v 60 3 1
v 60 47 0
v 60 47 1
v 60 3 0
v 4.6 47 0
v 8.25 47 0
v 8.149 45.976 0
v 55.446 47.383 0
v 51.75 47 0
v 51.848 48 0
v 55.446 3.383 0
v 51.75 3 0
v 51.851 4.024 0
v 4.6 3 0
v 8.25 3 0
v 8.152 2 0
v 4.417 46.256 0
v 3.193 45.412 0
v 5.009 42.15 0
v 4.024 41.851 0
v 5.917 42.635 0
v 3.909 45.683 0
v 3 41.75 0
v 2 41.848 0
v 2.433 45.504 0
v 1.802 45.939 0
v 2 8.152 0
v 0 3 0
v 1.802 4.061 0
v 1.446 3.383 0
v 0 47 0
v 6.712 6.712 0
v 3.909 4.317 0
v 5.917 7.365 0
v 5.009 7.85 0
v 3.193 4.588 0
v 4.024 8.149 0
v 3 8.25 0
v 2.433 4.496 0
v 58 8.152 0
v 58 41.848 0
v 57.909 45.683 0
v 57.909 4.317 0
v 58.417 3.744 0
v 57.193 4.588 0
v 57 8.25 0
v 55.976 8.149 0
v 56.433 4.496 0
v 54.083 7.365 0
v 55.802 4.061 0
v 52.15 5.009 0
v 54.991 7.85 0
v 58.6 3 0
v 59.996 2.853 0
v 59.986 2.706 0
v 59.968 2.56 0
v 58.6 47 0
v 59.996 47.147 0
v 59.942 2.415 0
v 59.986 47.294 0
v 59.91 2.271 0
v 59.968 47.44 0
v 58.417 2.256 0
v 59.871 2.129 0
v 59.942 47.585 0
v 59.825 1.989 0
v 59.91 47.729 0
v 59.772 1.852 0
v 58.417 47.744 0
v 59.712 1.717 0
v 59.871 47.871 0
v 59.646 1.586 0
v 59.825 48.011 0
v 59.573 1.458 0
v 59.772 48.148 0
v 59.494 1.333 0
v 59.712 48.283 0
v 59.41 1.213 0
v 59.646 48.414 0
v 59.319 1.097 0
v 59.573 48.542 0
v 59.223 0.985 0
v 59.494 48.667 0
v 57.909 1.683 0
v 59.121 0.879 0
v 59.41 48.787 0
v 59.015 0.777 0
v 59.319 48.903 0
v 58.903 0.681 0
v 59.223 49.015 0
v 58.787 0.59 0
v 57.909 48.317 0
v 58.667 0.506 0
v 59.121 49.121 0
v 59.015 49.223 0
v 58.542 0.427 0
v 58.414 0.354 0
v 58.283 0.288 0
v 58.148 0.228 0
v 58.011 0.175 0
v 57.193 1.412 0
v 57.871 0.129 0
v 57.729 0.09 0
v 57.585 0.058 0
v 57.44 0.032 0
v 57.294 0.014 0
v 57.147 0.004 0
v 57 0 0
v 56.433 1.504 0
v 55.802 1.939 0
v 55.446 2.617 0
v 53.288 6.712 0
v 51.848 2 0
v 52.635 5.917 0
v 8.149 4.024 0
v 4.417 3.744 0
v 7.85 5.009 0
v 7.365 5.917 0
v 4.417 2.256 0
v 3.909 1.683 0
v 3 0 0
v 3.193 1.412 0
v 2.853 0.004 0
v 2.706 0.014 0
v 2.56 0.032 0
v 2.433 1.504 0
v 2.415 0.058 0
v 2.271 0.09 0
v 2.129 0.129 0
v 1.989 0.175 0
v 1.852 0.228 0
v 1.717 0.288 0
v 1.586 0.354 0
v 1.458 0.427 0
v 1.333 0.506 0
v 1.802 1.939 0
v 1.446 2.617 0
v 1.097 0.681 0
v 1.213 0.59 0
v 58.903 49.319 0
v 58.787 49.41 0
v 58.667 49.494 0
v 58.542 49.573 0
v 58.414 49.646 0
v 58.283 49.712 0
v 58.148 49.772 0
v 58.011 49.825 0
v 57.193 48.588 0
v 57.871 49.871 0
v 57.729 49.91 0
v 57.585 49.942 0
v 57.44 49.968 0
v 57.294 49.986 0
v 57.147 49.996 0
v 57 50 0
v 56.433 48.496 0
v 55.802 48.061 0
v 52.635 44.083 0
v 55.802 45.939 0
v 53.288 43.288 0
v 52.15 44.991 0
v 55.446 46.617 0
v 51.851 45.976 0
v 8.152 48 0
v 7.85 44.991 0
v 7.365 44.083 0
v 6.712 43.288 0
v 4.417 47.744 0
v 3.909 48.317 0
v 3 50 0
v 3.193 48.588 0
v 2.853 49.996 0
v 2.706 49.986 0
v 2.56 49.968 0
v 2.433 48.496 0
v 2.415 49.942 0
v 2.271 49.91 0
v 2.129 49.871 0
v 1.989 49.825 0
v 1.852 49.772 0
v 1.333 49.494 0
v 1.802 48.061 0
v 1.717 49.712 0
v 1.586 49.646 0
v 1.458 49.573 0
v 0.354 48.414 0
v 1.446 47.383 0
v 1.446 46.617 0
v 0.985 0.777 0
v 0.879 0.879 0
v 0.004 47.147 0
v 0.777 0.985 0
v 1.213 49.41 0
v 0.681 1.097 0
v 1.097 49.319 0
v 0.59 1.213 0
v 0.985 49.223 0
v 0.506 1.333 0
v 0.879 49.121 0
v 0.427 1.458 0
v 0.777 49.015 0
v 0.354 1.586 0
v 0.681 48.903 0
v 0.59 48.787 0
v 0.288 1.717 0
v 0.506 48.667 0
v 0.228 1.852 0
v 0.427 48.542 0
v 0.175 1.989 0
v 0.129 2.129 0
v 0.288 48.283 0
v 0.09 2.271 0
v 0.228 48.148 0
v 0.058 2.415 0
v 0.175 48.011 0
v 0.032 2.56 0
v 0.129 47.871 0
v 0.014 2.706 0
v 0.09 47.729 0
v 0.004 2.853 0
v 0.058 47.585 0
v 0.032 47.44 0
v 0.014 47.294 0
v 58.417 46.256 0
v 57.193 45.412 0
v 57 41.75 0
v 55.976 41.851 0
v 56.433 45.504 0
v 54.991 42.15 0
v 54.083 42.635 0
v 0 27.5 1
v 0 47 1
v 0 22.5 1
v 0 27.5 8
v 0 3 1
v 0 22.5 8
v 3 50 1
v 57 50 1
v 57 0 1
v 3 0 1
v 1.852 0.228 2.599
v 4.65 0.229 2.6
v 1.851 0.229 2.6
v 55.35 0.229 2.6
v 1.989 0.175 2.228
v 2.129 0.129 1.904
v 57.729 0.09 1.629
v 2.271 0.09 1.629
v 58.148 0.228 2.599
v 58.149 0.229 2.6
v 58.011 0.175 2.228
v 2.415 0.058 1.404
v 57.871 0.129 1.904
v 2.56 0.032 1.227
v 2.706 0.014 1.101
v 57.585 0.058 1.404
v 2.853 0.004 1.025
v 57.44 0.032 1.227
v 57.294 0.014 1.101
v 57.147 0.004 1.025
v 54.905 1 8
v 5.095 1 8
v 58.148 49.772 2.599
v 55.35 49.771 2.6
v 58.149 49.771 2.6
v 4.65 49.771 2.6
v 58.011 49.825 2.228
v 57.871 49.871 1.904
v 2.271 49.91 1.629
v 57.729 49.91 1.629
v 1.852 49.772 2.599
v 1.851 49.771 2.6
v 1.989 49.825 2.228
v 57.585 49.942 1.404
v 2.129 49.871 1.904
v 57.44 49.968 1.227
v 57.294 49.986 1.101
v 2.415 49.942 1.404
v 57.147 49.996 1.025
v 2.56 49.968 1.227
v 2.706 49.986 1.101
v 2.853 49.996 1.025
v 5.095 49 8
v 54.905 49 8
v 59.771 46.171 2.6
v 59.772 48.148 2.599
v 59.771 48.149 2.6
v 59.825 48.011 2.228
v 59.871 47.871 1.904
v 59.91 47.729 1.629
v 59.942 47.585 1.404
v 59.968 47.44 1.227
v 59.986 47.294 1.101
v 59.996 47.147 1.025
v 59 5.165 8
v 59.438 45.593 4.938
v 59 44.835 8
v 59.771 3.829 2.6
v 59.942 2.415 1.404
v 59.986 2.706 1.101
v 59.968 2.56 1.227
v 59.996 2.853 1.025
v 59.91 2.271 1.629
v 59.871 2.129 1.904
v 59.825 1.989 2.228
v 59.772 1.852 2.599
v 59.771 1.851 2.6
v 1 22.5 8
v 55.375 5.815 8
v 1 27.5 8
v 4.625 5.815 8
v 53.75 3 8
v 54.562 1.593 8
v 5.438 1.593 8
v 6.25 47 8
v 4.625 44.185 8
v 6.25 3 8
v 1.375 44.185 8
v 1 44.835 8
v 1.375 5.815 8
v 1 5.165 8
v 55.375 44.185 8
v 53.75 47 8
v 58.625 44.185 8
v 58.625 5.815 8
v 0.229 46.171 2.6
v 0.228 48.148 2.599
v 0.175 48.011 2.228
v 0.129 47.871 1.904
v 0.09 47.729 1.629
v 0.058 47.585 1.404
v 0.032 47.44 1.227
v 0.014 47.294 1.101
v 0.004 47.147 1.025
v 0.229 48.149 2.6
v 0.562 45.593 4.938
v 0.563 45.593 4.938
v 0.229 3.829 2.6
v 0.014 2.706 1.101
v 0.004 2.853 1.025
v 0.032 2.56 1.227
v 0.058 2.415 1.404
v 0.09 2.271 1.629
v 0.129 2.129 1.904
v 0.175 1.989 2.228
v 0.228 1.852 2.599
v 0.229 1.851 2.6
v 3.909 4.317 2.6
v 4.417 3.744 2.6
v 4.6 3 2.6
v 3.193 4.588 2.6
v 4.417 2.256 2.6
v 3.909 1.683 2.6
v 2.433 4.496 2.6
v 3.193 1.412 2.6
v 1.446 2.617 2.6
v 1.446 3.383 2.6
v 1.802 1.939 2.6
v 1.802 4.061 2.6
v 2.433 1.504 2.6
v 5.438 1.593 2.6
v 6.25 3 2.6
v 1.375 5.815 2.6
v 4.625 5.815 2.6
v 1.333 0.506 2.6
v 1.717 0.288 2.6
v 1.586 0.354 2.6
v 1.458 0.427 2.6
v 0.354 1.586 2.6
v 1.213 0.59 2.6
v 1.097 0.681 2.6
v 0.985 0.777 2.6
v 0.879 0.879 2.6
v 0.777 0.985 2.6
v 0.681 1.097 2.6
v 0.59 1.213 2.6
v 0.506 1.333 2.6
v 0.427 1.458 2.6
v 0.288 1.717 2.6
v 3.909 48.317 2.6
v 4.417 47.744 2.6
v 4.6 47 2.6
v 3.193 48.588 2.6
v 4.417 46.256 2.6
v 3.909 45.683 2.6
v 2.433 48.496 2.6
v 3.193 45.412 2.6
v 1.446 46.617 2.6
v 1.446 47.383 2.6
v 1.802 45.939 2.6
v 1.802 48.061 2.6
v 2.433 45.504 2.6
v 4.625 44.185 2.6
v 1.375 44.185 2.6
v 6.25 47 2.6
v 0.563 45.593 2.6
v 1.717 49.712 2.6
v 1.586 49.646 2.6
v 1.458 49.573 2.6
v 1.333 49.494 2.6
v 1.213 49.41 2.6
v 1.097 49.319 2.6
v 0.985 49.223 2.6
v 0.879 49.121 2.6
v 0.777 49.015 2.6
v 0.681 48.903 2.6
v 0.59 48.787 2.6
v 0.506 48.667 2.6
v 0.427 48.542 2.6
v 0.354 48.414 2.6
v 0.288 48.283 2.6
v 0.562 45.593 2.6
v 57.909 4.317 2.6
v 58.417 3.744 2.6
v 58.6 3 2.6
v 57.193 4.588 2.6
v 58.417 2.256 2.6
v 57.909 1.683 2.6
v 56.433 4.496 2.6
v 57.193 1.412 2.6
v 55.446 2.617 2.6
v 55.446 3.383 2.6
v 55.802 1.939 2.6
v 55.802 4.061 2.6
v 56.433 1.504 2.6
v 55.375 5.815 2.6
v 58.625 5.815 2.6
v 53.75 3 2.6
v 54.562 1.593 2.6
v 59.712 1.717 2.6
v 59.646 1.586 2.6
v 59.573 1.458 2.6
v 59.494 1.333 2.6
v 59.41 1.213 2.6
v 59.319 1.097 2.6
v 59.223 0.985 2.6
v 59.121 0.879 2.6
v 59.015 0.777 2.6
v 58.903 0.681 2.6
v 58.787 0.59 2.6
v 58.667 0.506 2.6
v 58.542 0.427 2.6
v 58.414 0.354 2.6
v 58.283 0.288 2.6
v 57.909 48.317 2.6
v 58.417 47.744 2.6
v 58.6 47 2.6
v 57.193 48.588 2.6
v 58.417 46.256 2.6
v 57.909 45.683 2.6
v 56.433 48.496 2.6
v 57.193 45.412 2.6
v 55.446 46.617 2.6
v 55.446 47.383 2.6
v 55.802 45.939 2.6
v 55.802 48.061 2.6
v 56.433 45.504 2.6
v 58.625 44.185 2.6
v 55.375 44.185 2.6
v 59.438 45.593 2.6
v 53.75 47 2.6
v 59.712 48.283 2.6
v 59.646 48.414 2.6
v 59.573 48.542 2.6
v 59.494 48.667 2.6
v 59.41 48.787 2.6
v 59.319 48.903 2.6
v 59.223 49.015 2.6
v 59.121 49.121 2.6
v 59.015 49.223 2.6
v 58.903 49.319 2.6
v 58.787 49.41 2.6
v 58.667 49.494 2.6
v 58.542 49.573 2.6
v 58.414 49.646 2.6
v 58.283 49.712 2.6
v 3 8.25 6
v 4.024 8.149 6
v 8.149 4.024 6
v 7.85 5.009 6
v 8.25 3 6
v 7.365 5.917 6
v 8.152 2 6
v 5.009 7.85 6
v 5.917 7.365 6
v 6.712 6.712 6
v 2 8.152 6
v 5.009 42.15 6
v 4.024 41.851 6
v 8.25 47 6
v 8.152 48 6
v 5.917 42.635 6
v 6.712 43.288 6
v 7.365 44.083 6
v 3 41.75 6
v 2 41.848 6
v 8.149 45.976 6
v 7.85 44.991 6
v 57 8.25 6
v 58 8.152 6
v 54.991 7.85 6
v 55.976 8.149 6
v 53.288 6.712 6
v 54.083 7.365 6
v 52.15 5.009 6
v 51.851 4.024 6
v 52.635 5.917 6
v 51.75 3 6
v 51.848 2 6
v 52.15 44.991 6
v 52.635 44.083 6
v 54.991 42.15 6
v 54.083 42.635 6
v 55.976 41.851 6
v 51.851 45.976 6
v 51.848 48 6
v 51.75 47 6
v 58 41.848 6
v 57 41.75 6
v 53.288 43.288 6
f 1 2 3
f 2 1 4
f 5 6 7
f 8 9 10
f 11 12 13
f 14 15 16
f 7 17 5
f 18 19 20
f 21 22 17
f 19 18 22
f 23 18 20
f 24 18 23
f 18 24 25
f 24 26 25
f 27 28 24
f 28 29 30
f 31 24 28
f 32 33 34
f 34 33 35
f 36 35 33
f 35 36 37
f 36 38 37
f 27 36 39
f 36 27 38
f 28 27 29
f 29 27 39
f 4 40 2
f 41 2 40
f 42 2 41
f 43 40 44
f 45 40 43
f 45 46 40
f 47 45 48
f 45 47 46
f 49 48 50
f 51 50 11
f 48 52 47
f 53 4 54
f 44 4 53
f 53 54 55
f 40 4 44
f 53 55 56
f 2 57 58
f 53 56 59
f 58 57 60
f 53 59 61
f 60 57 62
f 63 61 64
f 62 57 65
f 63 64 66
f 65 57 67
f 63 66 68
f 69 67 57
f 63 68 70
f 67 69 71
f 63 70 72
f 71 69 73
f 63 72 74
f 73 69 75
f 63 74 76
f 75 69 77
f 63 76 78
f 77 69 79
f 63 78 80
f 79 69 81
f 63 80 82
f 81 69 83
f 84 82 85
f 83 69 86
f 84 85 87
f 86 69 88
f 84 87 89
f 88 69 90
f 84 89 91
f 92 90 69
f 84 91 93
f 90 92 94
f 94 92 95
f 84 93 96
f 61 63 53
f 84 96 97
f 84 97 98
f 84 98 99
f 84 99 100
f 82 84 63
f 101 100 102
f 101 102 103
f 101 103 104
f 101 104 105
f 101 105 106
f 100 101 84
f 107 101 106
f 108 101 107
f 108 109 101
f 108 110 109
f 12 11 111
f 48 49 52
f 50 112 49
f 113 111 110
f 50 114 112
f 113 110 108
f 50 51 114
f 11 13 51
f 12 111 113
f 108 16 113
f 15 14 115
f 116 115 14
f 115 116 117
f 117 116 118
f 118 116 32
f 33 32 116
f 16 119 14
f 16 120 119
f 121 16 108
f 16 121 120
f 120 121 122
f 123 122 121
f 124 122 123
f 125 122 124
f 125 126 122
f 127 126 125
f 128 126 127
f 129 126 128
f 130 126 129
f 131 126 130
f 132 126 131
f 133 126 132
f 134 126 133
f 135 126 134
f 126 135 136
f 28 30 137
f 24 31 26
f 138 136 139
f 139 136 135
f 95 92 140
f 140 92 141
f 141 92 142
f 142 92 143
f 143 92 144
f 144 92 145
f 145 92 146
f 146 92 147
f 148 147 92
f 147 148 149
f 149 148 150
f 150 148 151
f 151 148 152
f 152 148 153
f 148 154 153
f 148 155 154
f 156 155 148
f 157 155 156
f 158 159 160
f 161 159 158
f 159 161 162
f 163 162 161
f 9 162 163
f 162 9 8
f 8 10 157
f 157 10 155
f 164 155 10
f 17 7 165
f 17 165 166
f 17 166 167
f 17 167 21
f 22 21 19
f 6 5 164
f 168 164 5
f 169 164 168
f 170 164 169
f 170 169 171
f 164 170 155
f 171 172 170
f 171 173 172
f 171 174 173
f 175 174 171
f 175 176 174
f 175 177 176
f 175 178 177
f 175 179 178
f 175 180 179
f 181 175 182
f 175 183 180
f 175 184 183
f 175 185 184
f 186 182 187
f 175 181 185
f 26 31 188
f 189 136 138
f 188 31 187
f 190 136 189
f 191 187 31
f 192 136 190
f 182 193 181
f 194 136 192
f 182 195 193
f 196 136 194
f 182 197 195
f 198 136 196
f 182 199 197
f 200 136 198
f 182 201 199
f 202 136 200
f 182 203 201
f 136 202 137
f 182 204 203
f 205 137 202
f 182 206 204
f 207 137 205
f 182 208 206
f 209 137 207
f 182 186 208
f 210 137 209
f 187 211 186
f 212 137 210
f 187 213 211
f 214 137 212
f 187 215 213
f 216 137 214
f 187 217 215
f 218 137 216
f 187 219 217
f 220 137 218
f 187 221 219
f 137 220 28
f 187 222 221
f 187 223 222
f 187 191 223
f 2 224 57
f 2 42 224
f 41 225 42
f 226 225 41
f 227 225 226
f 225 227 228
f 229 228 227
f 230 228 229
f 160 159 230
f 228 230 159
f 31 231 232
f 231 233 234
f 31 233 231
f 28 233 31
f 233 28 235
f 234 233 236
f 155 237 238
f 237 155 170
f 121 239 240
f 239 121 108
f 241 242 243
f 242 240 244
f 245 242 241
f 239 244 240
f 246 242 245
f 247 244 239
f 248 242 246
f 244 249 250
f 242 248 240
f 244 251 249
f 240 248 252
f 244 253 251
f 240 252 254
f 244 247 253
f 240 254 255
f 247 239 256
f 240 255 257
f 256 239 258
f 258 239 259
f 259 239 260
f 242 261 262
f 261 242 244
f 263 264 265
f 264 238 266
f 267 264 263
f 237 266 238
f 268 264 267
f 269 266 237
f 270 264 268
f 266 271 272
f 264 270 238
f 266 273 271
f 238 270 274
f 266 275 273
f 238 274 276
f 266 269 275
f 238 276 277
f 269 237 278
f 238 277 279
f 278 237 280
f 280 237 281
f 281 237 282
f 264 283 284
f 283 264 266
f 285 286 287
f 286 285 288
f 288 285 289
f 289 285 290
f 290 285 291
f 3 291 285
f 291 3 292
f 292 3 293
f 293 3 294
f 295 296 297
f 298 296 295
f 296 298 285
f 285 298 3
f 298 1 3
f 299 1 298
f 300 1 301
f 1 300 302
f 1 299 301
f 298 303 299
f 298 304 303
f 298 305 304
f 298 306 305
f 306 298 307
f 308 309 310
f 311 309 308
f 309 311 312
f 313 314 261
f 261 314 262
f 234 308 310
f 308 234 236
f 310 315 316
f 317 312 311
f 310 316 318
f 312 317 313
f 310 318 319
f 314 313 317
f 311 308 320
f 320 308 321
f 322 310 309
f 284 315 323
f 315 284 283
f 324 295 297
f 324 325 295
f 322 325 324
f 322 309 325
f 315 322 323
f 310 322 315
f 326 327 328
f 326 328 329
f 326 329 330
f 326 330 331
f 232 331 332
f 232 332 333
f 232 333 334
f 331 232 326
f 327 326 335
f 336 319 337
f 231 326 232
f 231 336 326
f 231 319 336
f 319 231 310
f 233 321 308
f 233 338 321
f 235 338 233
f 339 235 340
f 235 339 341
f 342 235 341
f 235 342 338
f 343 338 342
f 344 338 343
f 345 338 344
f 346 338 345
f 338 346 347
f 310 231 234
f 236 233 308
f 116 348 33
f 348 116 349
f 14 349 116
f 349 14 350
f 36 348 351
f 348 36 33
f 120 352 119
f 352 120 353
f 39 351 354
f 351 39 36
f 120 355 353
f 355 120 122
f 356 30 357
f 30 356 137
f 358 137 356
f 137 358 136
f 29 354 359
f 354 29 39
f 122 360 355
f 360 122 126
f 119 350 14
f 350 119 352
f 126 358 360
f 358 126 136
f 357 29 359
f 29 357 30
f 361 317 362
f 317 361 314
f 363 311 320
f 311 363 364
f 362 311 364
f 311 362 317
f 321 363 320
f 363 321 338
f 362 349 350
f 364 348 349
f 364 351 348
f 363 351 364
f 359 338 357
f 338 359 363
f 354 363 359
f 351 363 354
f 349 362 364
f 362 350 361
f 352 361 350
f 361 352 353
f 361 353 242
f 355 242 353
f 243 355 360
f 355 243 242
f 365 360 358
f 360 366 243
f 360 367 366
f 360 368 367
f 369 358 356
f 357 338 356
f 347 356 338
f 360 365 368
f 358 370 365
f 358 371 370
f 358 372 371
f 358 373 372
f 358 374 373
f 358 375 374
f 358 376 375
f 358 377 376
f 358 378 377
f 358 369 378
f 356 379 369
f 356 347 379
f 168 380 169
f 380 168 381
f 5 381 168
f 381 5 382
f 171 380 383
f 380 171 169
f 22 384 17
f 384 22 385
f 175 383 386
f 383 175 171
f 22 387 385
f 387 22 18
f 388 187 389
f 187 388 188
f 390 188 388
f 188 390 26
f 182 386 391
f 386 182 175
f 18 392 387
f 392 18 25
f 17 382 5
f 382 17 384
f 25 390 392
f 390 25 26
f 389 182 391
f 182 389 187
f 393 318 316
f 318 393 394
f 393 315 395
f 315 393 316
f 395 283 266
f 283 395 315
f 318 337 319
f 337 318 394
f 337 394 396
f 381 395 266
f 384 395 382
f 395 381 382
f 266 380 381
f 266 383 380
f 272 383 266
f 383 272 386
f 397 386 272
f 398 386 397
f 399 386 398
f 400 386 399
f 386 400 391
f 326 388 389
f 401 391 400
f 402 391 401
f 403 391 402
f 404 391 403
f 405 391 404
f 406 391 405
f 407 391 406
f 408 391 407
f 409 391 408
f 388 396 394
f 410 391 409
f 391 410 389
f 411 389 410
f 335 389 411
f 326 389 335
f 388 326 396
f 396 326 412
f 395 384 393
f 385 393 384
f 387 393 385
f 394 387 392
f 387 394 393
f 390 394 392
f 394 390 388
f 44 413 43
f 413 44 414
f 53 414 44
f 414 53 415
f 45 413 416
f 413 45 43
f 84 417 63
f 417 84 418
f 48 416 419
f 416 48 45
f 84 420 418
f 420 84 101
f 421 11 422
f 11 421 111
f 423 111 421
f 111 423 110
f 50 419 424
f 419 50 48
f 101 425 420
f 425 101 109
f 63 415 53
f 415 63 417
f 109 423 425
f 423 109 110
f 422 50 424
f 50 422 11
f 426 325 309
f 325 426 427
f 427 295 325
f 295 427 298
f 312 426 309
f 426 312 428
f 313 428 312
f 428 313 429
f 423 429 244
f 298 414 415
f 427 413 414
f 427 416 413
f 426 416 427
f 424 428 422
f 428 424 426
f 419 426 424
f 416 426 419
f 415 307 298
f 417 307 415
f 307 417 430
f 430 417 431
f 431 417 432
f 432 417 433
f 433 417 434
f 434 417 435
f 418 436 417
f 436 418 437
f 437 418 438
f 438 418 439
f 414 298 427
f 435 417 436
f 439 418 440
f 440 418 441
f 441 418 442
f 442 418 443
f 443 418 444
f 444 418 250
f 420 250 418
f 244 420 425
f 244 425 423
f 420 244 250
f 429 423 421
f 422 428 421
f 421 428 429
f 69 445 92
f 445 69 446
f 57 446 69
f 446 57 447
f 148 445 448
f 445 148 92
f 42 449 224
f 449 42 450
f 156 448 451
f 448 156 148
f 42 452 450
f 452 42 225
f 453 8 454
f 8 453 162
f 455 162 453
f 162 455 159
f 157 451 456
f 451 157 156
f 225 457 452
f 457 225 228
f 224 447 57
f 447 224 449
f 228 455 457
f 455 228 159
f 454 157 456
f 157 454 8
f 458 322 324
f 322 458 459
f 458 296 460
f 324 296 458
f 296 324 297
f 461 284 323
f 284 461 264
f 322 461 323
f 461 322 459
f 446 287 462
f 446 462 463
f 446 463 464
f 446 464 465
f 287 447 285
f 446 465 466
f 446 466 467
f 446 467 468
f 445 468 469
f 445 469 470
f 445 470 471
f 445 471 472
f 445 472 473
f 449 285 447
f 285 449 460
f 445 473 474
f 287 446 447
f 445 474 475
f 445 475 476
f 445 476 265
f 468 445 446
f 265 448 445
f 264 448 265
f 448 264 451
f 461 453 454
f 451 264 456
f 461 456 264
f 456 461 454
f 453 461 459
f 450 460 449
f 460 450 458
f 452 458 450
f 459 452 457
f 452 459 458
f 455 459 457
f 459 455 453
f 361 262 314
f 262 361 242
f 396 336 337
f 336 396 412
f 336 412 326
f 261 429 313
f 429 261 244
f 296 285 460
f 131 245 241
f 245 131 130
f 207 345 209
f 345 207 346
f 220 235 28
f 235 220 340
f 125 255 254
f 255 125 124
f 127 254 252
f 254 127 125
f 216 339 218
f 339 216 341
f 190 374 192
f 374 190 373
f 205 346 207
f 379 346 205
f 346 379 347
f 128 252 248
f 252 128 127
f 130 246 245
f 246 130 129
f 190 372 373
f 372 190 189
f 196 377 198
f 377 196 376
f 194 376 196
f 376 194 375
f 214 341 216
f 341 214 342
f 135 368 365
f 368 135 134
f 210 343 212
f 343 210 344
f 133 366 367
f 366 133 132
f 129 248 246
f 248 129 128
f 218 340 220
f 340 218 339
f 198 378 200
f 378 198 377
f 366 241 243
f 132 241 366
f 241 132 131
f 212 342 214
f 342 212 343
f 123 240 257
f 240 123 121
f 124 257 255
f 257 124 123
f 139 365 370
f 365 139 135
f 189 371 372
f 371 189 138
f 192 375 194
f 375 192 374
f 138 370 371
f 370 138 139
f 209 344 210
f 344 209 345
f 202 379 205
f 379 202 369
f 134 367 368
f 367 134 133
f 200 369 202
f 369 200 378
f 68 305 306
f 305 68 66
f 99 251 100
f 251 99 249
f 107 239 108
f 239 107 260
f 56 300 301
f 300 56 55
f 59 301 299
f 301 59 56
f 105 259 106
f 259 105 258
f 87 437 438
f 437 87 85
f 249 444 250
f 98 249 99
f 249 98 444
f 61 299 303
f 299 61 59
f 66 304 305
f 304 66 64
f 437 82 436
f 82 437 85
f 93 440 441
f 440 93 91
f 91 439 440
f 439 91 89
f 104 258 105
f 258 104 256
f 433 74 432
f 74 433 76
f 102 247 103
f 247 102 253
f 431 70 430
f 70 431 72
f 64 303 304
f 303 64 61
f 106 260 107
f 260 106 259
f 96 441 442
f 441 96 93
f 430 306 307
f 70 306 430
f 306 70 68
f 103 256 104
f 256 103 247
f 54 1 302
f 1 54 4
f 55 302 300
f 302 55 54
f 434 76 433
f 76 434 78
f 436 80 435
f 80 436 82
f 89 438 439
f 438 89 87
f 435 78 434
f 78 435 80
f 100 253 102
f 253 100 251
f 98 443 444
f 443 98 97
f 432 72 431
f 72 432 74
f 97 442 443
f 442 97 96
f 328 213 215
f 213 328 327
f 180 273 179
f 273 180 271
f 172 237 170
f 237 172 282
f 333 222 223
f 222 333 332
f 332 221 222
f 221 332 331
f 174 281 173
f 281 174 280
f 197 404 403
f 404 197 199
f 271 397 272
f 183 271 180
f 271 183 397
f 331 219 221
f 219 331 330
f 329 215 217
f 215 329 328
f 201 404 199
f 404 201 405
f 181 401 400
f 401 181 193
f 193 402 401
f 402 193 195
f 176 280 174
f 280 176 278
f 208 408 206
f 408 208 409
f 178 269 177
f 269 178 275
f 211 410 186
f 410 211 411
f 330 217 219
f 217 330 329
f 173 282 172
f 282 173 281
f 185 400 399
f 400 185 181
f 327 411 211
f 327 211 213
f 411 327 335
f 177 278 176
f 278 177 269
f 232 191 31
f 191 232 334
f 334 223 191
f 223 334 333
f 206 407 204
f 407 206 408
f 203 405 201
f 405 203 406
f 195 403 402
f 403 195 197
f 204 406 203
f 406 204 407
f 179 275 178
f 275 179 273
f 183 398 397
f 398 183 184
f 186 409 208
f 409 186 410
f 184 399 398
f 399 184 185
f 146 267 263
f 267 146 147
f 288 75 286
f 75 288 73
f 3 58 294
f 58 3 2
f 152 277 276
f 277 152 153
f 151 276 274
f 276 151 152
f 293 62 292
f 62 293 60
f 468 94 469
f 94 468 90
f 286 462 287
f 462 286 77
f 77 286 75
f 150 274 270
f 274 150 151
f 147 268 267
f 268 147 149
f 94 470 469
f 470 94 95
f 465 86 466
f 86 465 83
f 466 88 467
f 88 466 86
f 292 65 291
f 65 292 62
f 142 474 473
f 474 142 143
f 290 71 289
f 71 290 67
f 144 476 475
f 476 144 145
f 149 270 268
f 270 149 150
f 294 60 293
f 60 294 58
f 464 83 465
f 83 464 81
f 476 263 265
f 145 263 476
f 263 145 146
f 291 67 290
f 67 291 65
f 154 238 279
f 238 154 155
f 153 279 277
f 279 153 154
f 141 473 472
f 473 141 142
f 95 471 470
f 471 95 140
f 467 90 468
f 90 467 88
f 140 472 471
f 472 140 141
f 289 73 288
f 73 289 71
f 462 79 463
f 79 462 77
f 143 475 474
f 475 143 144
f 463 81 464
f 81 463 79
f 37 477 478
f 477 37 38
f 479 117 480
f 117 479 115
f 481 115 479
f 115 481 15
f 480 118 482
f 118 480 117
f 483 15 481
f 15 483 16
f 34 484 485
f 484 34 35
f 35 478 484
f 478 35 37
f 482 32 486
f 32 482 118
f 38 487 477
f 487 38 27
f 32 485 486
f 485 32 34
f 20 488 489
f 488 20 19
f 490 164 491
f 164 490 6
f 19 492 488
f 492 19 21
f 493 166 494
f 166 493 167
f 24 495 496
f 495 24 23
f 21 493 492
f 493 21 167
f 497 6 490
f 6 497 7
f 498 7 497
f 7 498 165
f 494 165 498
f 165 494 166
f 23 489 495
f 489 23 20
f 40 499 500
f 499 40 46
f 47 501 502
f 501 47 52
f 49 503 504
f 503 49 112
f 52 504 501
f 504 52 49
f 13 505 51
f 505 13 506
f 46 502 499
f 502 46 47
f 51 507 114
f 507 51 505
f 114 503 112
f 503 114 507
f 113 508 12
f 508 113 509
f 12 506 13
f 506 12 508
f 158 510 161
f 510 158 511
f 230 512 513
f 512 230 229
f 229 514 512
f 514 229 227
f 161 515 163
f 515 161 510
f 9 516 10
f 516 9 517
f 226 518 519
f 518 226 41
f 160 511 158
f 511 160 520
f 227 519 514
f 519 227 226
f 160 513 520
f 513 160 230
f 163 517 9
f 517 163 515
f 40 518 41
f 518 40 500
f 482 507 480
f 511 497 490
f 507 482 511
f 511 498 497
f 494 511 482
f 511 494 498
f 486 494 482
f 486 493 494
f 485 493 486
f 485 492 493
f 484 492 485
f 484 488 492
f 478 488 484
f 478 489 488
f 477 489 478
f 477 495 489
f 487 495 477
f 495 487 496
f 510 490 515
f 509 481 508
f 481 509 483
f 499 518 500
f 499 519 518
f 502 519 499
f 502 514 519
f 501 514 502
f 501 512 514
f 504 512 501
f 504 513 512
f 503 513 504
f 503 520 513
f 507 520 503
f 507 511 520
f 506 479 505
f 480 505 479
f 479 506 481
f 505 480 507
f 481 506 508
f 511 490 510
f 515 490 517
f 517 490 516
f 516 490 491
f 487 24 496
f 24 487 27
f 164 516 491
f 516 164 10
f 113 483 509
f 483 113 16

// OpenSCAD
// file: ../lib/utils.scad
module clearance_hole(d, h=100, clearance=0.2, e=0.1) {
	cylinder(r=(d+clearance)/2, h=h+e, $fn=min(64, 4 + 3*d));
}

module z_fillet(r=5, h=100, e=0.1) {
	difference() {
	translate([0-e, 0-e, 0])
		cube([r+e, r+e, h]);
	translate([r, r, 0-e])
		cylinder(r=r, h=h+e+e, $fn=$fn*4);
	}
}

module hexagonal_prism(d_flat=8, h=10) {
    r = d_flat / sqrt(3); // Circumradius
    cylinder(h=h, r=r, $fn=6);
}

module grip_texture(length, depth, height) {
	n = floor(length/depth); // TODO: number of teeth
	e = 0.1;
	xOffset = (length - depth*n)/2;
	difference() {
		translate([0, 0-e, 0-e])
		cube([length, depth+e, height+e+e]);
		for (i = [0:n]) {
			translate([i*depth*2 - xOffset, depth, 0-e])
			cylinder(r=depth, h=height+e+e, $fn=4);
		}
	}
}

module lanyard_loop(length=30, width=8, height=10, overflow=0, slotDiameter=5) {
	e=0.1;
	wall = (height - slotDiameter)/2;
	assert(wall > 0, "slotDiameter too large for lanyard loop");
	difference() {
		union() {
			translate([0-overflow, 0, 0])
			cube([height+overflow, length, width]);
			translate([0, length, 0])
				z_fillet(height/2, h=width);
		}
		translate([height, 0, 0-e])
		rotate([0, 0, 90])
		z_fillet(height/2);
		translate([height, length, 0-e])
		rotate([0, 0, 180])
		z_fillet(height/2);

		// slot
		slotLength = length - wall*3 - slotDiameter;
		translate([wall, wall, 0-e])
			round_rect(size=[slotDiameter, slotLength, width+e+e], r=slotDiameter/2);
		translate([height/2, length - slotDiameter/2 - wall, 0-e])
		cylinder(r=slotDiameter/2, h=width+e+e);
	}
}

module round_rect(size=[10, 10, 10], r=1) {
	difference() {
		cube(size);
		if (r > 0) {
			for (i = [[0,0,0], [1,0,90], [1,1,180], [0,1,270]]) {
				translate([i[0]*size[0], i[1]*size[1], -.1])
				rotate([0, 0, i[2]])
					z_fillet(r, h=size[2]+0.2);
			}
		}
	}
}

function mounting_bolts(length, width, holeOffset) = [
	[ holeOffset, holeOffset],
	[ holeOffset, width - holeOffset],
	[ length - holeOffset, holeOffset],
	[ length - holeOffset, width - holeOffset]
];

function hexWrenchSize(width) = width / 2 * sqrt(3);
// file: ../cover.scad
use <lib/utils.scad>;

module case_cover(
	length=47,
	width=50,
	thickness=4,
	hex=false,
	counterboreDepth=3,
	counterboreDiameter=8) {

	bottomThickness = 1;
	topThickness = 2;
	mountHoleOffset = 3; // must match the value in case_frame
	mountHoleSize = 3;
	draftOffset = 1;
	wallThickness = 2;
	wrenchSize = hexWrenchSize(counterboreDiameter);
	echo("Counterbore size: ", counterboreDiameter, "\n");
	echo("Wrench size: ", wrenchSize, "\n");
	e = 0.1; // small waste number; not for final geometry

	assert(thickness >= (counterboreDepth+bottomThickness), "case_cover thickness is too small");

	difference() {
		union() {
			cube([
				length,
				width,
				bottomThickness
			]);
			translate([0, 0, bottomThickness])
				truncated_pyramid(length=length, width=width, height=thickness-bottomThickness, inset=draftOffset);

			// Feet - for stability
			footWidth = 5;
			translate([0, (width - footWidth)/2, 0])
				cube([ length/2, footWidth, thickness]);

		}

		for (
			position = mounting_bolts(length, width, mountHoleOffset)
		) {
			translate([position[0], position[1], 0]) {
				clearance_hole(mountHoleSize);
				translate([0,0, thickness - counterboreDepth])
				if (hex) {
					cylinder(r=counterboreDiameter/2, h=counterboreDepth+e+e, $fn=6);
				} else {
					clearance_hole(counterboreDiameter, counterboreDepth+e);
				}
			}
		}

		// Remove corner material if hex
		if (hex) {
			positions = mounting_bolts(length, width, mountHoleOffset);
			hexCornerDifference( // bottom-right
				position=positions[0],
				angle=-120,
				width=wrenchSize,
				depth=counterboreDepth,
				thickness=thickness
			);
			hexCornerDifference( // bottom-left
				position=positions[1],
				angle=120,
				width=wrenchSize,
				depth=counterboreDepth,
				thickness=thickness
			);
			hexCornerDifference( // top-right
				position=positions[2],
				angle=300,
				width=wrenchSize,
				depth=counterboreDepth,
				thickness=thickness
			);
			hexCornerDifference( // top-left
				position=positions[3],
				angle=60,
				width=wrenchSize,
				depth=counterboreDepth,
				thickness=thickness
			);
		}

		// Corner Radiuses
		translate([0, 0, 0-e])          rotate([0, 0, 0])    z_fillet(3);
		translate([length, 0, 0-e])     rotate([0, 0, 90])   z_fillet(3);
		translate([0, width, 0-e])      rotate([0, 0, 270])  z_fillet(3);
		translate([length, width, 0-e]) rotate([0, 0, 180])  z_fillet(3);

		// Inner cavity
		difference() {
			translate([
				wallThickness,
				wallThickness,
				0-e
			])
			cube([
				length - 2*wallThickness,
				width - 2*wallThickness,
				thickness - topThickness + e
			]);

			for (position = mounting_bolts(length, width, mountHoleOffset)) {
				translate([position[0], position[1], 0-e]) {
					innerCavityRadius = max((counterboreDiameter/2)+topThickness,wallThickness);
					cylinder(r=innerCavityRadius, h=thickness-topThickness+e+e);
				}
			}
		}
	}

}

module hexCornerDifference(
	position,
	angle,
	width,
	depth,
	thickness
) {
	length=100; // any long enough number
	translate([position[0], position[1], 0])
	rotate([0,0,angle])
	translate([0, 0-width/2, thickness-depth])
		cube([length, width, depth]);
}

module truncated_pyramid(length, width, height, inset=5) {
	polyhedron(
		points=[
			[0      , 0     , 0]      , // 0
			[length , 0     , 0]      , // 1
			[length , width , 0]      , // 2
			[0      , width , 0]      , // 3

			[inset        , inset       , height] , // 4
			[length-inset , inset       , height] , // 5
			[length-inset , width-inset , height] , // 6
			[inset        , width-inset , height] , // 7
		],
		faces=[
			[1, 0, 4],
			[4, 5, 1],
			[2, 1, 5],
			[5, 6, 2],
			[3, 2, 6],
			[6, 7, 3],
			[0, 3, 7],
			[7, 4, 0],
			[7, 6, 5],
			[4, 7, 5],
			[0, 1, 3],
			[1, 2, 3],
		],
		convexity=1
	);
}

case_cover($fn=32);
// main file
use <../cover.scad>;

width             = 50;
length            = 60;
topThickness      = 2;
batteryThickness  = 6;
thickness         = topThickness+batteryThickness;
fastenerThickness = 2.6; // thickness at the fasteners

case_cover(
	length=length,
	width=width,
	thickness=thickness,
	hex=true,
	counterboreDepth=(thickness-fastenerThickness),
	counterboreDiameter=6.5,  // wrench size of an M3 + clearance
	$fn=32
);
